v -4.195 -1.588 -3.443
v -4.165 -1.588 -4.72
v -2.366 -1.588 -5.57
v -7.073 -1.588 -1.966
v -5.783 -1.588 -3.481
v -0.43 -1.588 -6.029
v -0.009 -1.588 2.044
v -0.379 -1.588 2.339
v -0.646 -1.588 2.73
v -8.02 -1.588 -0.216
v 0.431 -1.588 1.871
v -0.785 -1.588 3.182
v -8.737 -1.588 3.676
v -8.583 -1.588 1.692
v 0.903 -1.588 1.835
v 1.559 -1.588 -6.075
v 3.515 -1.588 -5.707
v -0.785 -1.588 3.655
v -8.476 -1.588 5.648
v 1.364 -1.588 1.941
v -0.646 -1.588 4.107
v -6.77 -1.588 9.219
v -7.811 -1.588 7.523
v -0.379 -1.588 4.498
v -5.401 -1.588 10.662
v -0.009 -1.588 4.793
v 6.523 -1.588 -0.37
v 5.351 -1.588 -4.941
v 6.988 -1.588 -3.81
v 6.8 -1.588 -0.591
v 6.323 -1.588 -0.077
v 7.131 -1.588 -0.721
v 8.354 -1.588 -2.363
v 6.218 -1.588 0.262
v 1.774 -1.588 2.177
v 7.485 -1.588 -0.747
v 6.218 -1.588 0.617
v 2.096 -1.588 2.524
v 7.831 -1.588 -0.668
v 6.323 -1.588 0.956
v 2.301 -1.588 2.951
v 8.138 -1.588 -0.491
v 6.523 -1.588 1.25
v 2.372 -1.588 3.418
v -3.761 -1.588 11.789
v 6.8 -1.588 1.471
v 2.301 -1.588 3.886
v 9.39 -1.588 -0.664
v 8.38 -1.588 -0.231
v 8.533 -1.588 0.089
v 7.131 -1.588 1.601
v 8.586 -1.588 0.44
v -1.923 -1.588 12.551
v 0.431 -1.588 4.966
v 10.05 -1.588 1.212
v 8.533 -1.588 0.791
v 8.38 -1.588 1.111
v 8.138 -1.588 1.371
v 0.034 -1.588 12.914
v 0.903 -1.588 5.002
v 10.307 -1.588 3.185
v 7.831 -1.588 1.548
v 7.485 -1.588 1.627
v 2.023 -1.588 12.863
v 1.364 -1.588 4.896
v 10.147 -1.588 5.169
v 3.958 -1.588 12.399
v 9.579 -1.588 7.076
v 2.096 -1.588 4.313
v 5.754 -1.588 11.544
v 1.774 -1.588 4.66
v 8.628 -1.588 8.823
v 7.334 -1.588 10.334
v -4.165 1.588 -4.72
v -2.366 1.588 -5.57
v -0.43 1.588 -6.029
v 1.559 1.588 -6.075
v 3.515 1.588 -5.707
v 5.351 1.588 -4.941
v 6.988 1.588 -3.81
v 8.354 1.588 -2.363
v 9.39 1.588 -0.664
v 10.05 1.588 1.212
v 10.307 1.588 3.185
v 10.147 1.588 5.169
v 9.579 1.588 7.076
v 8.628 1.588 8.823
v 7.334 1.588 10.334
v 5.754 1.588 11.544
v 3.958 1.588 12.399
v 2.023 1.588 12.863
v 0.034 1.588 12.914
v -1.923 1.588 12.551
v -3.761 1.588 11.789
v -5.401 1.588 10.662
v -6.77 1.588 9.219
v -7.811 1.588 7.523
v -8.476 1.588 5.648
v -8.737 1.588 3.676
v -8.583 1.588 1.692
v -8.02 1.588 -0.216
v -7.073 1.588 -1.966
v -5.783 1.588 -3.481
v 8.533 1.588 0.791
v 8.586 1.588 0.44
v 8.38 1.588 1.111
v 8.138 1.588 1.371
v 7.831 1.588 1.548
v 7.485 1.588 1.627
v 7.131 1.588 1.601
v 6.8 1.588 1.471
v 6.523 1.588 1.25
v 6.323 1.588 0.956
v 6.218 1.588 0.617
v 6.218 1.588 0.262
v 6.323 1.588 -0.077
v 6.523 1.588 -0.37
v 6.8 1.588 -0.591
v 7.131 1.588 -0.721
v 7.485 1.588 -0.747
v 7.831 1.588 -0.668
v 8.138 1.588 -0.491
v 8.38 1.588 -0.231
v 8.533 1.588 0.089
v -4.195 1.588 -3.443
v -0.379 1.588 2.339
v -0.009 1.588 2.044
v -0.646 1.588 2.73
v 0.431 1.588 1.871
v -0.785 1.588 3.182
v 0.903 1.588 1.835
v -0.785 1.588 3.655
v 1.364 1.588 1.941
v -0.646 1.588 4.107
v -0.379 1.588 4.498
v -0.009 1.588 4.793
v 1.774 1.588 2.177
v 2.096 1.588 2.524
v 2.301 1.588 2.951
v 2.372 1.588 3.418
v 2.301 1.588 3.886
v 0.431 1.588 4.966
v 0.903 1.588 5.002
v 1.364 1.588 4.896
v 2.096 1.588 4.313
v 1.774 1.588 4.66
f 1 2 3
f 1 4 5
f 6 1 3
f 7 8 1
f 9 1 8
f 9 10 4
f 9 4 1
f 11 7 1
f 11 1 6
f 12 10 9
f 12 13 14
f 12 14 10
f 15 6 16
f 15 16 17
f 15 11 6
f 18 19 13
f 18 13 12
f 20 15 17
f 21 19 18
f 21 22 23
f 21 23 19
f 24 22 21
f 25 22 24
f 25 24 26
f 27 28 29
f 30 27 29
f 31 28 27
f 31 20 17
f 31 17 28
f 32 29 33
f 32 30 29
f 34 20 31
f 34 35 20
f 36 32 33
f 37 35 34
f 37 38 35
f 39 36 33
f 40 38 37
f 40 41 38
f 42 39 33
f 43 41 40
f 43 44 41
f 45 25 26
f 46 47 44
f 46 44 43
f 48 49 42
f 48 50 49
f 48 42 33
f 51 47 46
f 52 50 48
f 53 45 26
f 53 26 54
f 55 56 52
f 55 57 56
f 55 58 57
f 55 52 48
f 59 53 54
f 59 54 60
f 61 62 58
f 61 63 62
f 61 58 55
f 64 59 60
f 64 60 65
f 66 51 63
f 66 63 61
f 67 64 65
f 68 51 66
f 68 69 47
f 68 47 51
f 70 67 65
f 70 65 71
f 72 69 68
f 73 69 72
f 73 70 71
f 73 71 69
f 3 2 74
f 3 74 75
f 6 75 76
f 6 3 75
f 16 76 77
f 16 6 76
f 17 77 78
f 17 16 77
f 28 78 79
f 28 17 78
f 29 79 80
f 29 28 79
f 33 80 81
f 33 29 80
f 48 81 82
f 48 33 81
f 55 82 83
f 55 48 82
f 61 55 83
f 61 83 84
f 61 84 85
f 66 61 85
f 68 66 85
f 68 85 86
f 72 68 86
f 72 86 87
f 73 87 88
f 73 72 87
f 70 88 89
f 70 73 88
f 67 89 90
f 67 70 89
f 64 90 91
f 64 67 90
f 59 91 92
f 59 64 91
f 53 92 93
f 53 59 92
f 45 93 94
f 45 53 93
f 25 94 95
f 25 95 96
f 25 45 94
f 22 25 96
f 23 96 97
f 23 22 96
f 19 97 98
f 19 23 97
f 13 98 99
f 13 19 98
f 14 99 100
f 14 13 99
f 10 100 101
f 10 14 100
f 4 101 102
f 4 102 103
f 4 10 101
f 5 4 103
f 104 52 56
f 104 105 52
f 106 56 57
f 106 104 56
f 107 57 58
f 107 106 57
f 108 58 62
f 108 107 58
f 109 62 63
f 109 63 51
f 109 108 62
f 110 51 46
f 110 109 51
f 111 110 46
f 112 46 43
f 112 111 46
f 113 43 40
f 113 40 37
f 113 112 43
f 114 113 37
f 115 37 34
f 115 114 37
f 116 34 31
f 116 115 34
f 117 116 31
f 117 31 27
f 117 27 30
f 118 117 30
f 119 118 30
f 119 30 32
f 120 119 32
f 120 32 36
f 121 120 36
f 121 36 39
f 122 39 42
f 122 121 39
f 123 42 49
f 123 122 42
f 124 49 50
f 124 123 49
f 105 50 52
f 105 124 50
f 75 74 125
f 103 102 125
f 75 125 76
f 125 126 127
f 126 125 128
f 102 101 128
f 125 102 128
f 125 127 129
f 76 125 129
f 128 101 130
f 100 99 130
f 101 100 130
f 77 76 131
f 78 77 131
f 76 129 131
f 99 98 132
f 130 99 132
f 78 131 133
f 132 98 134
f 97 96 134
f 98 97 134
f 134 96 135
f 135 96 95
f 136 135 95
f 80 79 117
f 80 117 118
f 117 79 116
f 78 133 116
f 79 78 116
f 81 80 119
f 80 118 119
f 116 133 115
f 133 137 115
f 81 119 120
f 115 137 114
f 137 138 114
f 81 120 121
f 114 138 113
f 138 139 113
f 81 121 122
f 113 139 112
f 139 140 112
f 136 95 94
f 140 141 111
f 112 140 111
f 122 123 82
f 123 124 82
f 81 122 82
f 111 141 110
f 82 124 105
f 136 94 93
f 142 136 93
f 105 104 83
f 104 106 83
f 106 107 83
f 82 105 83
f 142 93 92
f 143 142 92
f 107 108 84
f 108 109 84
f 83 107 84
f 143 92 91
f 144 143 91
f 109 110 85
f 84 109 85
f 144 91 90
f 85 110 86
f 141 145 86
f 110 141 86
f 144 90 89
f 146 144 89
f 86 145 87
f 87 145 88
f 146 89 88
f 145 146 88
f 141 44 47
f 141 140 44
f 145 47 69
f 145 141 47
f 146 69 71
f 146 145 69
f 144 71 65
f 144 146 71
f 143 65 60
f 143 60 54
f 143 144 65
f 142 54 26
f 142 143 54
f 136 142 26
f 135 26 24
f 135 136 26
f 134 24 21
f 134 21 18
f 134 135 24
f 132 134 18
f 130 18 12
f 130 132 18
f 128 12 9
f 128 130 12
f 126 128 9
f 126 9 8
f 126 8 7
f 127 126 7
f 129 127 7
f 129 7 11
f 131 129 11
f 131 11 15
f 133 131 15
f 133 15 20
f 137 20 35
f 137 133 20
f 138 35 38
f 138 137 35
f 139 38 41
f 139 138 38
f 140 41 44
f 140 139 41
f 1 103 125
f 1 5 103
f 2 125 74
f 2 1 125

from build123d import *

# Parameters (mm, degrees)
F0_R     = 1.190625
F0_R_2   = 1.5875
F1_DEPTH = 1.5875


with BuildPart() as f1:
    # F0 (on Front) → F1 (new body, symmetric)
    with BuildSketch(Plane.XZ):
        with BuildLine():
            Line((-4.19507, -3.443071), (-4.164685, -4.719849))
            ThreePointArc((-4.164685, -4.719849), (6.575626, 10.980695), (-5.78257, -3.480852))
            Line((-5.78257, -3.480852), (-4.19507, -3.443071))
        make_face()
        with Locations((7.395771, 0.439879)):
            Circle(F0_R, mode=Mode.SUBTRACT)
        with Locations((0.784385, 3.418477)):
            Circle(F0_R_2, mode=Mode.SUBTRACT)
    extrude(amount=F1_DEPTH, both=True)


solid = f1.part
